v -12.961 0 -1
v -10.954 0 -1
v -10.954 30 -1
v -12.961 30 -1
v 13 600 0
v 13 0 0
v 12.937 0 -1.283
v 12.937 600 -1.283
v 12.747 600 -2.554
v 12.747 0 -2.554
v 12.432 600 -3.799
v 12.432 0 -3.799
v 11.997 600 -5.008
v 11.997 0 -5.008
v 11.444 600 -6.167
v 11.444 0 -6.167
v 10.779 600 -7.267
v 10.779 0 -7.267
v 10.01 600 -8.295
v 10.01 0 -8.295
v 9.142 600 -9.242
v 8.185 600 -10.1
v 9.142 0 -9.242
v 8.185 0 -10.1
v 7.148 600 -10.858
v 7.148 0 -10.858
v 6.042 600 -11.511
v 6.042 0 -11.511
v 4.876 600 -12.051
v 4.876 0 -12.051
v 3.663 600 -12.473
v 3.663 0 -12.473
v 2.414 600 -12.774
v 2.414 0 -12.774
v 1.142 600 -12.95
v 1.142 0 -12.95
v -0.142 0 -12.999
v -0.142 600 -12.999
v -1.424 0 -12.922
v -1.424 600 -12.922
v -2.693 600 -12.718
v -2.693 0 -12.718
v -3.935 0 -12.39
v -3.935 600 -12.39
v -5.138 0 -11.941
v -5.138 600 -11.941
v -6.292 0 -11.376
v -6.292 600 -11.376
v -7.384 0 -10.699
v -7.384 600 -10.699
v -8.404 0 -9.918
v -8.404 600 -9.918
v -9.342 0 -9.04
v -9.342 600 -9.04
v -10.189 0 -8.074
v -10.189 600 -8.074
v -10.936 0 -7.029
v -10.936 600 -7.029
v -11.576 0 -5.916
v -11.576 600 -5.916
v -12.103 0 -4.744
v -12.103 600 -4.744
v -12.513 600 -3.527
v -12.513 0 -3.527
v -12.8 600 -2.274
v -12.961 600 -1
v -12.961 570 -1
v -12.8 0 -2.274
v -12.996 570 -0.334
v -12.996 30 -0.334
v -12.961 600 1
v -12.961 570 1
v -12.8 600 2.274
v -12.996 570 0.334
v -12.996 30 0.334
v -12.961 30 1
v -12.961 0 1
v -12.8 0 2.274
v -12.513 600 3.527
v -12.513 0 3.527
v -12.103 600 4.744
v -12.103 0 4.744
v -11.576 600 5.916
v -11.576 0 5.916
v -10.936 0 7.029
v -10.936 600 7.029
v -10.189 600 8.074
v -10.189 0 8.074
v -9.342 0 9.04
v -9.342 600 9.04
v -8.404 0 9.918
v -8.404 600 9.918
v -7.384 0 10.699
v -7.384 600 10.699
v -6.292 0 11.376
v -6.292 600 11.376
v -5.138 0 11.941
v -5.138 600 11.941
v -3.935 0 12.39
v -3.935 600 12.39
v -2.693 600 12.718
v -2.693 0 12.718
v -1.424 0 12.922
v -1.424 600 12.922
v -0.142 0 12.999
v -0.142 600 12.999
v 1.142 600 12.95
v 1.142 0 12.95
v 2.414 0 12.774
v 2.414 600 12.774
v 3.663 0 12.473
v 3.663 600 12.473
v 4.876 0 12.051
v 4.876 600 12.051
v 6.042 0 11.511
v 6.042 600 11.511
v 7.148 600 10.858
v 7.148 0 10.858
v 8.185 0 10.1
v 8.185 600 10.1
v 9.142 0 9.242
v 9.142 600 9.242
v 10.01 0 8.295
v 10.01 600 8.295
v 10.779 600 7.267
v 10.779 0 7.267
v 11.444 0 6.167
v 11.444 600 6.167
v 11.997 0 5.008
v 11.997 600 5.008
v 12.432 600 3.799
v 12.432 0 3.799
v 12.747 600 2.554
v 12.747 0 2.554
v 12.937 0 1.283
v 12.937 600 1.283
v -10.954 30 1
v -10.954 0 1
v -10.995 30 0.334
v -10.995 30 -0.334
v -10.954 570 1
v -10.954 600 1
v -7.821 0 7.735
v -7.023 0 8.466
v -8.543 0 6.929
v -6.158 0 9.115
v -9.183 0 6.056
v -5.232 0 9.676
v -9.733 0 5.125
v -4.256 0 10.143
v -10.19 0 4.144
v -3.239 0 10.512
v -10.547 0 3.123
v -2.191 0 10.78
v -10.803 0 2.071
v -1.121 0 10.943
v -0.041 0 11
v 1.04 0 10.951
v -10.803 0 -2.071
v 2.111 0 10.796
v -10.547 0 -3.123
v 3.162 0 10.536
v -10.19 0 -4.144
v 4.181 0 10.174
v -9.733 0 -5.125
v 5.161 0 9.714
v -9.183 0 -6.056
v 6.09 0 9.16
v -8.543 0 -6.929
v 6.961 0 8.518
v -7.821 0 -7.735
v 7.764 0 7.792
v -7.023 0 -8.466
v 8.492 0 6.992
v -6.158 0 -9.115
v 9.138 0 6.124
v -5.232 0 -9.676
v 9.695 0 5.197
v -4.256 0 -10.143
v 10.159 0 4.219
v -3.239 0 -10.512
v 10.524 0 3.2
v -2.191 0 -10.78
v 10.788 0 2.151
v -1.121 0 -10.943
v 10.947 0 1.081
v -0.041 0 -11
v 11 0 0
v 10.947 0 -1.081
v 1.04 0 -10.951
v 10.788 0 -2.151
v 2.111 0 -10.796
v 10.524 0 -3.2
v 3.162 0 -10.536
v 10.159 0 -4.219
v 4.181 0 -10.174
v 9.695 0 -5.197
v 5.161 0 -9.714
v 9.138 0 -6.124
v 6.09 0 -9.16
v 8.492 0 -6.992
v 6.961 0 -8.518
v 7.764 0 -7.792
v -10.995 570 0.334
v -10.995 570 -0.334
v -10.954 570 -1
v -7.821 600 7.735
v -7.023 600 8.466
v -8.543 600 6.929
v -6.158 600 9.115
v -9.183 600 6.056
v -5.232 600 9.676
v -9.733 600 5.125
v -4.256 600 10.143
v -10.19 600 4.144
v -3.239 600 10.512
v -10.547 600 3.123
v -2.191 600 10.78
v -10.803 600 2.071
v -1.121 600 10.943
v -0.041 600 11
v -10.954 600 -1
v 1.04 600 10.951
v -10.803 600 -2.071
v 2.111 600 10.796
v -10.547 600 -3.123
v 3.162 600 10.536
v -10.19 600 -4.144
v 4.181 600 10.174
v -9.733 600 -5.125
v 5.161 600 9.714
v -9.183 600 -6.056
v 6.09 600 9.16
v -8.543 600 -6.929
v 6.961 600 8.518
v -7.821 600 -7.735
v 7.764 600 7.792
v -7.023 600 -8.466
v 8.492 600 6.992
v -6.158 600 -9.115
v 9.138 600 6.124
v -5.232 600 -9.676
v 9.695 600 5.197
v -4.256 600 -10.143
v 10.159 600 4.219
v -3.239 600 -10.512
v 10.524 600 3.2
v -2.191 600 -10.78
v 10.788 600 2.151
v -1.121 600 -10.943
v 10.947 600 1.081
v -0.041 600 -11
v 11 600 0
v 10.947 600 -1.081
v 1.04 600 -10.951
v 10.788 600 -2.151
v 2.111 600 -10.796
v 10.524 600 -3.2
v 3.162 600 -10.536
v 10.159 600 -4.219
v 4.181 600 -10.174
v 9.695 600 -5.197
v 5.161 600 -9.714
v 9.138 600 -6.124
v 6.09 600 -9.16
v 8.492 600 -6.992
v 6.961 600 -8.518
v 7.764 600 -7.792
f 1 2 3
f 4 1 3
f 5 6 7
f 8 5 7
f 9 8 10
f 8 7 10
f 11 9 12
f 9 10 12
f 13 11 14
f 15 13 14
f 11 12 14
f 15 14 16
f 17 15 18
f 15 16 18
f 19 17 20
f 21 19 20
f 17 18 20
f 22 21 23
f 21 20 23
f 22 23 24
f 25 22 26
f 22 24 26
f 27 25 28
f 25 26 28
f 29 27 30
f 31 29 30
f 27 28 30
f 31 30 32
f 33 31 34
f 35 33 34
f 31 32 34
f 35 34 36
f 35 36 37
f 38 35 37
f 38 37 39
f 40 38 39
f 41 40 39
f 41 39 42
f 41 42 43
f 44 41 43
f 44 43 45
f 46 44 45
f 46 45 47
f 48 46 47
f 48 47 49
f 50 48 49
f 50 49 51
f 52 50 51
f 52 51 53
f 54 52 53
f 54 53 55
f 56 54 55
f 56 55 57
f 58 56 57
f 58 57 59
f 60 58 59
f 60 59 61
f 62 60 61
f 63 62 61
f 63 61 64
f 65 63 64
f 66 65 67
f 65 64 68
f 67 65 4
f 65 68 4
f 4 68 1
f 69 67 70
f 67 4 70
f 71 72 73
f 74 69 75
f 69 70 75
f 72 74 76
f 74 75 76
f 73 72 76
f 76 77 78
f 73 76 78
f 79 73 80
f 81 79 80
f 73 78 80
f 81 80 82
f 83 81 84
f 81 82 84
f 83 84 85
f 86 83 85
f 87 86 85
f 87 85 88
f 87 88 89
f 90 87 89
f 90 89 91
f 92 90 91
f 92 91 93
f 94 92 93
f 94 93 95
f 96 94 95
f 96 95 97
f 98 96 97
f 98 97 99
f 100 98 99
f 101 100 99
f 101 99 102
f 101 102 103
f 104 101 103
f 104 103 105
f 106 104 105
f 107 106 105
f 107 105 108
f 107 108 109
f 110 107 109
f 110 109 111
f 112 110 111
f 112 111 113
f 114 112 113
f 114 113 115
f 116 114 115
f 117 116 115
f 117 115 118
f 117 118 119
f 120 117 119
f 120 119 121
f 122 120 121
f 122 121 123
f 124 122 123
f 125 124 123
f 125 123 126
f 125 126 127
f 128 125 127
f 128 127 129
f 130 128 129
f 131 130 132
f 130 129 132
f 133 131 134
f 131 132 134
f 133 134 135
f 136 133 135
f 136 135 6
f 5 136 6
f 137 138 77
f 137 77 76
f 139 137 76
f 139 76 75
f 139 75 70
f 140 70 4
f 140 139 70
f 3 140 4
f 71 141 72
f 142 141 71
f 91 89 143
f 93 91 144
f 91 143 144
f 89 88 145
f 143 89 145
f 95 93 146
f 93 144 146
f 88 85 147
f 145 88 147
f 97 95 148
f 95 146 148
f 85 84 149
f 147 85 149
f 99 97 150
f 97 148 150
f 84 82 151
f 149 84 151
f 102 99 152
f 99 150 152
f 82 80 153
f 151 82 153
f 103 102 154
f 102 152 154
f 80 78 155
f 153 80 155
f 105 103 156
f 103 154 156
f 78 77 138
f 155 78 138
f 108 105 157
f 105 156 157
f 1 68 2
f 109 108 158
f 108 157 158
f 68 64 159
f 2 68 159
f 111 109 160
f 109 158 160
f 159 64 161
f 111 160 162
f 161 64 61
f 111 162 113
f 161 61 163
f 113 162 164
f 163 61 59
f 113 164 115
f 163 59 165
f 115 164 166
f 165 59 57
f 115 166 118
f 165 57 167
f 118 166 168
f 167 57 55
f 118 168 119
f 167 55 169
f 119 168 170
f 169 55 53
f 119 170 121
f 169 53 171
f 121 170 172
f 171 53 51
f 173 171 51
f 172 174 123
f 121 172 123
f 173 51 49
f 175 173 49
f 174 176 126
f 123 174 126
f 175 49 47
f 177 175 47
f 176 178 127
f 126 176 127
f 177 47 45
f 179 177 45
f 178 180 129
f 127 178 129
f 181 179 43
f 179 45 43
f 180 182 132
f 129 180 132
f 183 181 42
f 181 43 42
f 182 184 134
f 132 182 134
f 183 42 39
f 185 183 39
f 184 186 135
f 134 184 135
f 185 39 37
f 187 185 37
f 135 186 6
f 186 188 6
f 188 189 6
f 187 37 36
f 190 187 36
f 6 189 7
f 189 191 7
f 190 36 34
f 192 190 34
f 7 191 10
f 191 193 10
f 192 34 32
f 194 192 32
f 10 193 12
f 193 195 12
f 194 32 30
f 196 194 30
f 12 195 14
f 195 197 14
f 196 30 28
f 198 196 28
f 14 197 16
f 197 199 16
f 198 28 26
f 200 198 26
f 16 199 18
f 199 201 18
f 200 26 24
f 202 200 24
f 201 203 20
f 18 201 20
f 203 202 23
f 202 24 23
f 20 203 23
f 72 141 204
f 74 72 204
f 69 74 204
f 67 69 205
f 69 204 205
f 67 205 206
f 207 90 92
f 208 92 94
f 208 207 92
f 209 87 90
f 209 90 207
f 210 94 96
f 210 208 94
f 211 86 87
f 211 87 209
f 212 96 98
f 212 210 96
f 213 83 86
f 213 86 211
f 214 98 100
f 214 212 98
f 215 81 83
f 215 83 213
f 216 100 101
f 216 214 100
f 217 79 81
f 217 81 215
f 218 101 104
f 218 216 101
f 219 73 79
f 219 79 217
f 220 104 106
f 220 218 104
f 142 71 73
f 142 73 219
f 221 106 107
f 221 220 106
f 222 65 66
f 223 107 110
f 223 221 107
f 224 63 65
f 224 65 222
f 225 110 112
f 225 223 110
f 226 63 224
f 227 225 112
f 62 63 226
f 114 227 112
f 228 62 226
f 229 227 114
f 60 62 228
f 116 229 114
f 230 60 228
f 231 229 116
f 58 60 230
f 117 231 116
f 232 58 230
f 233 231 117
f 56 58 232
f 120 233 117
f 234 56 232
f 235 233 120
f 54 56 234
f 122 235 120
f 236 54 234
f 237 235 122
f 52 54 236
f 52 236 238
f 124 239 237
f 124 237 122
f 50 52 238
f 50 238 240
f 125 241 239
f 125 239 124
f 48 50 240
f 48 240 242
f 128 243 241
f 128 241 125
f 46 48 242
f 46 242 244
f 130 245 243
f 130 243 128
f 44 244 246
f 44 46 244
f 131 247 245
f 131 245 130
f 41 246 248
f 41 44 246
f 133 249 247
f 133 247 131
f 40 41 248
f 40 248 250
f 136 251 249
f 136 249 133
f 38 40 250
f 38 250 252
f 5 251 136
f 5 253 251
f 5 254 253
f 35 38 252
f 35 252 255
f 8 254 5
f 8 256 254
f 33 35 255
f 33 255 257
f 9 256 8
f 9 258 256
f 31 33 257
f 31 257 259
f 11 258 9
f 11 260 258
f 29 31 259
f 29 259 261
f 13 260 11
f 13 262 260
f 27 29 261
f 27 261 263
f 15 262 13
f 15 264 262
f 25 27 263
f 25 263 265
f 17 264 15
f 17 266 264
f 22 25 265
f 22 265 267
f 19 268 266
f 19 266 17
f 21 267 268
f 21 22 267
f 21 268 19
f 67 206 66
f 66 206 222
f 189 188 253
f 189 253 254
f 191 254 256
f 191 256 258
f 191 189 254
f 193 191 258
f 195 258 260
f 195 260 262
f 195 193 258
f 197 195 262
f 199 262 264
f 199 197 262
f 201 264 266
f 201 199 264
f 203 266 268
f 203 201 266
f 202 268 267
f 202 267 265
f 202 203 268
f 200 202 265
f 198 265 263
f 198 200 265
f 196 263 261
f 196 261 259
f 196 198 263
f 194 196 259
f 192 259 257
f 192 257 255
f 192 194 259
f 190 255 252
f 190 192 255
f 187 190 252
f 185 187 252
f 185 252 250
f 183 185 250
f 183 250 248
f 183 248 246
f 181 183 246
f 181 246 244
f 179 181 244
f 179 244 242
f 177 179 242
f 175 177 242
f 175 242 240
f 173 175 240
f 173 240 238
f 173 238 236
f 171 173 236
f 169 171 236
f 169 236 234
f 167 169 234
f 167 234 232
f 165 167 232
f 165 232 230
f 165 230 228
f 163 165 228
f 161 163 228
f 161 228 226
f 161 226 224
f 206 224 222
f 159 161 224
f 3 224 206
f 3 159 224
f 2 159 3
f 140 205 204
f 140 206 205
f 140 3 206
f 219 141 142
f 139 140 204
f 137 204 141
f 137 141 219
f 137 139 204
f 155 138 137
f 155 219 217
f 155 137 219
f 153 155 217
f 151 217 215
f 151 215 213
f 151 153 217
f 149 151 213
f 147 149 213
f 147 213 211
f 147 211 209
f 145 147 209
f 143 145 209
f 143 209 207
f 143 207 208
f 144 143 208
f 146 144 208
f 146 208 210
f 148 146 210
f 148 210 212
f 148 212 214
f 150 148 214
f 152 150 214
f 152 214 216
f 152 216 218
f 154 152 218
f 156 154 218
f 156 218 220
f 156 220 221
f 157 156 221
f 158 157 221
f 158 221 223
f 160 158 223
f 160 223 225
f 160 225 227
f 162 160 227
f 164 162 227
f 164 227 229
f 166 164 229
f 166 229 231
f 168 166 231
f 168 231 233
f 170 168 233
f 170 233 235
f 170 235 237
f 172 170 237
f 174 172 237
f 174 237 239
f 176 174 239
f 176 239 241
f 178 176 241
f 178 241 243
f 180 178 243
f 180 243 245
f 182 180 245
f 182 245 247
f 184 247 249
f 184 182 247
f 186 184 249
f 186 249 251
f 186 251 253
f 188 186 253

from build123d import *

# Parameters (mm, degrees)
SKETCH_1_R          = 13
SKETCH_1_R_2        = 11
EXTRUDE_1_DEPTH     = 600
SKETCH_2_W          = 2
SKETCH_2_H          = 30
CUT_EXTRUDE_1_DEPTH = 14


with BuildPart() as part:
    # 草图1 → 凸台-拉伸1 (new body)
    with BuildSketch(Plane(origin=(0, 0, 0), x_dir=(1, 0, 0), z_dir=(0, 1, 0))):
        Circle(SKETCH_1_R)
        Circle(SKETCH_1_R_2, mode=Mode.SUBTRACT)
    extrude(amount=EXTRUDE_1_DEPTH)

    # 草图2 → 切除-拉伸1 (cut, through all)
    with BuildSketch(Plane(origin=(0, 0, 0), x_dir=(0, 0, -1), z_dir=(1, 0, 0))):
        with Locations((0, 585)):
            Rectangle(SKETCH_2_W, SKETCH_2_H)
        with Locations((0, 15)):
            Rectangle(SKETCH_2_W, SKETCH_2_H)
    extrude(amount=-CUT_EXTRUDE_1_DEPTH, mode=Mode.SUBTRACT)


solid = part.part
